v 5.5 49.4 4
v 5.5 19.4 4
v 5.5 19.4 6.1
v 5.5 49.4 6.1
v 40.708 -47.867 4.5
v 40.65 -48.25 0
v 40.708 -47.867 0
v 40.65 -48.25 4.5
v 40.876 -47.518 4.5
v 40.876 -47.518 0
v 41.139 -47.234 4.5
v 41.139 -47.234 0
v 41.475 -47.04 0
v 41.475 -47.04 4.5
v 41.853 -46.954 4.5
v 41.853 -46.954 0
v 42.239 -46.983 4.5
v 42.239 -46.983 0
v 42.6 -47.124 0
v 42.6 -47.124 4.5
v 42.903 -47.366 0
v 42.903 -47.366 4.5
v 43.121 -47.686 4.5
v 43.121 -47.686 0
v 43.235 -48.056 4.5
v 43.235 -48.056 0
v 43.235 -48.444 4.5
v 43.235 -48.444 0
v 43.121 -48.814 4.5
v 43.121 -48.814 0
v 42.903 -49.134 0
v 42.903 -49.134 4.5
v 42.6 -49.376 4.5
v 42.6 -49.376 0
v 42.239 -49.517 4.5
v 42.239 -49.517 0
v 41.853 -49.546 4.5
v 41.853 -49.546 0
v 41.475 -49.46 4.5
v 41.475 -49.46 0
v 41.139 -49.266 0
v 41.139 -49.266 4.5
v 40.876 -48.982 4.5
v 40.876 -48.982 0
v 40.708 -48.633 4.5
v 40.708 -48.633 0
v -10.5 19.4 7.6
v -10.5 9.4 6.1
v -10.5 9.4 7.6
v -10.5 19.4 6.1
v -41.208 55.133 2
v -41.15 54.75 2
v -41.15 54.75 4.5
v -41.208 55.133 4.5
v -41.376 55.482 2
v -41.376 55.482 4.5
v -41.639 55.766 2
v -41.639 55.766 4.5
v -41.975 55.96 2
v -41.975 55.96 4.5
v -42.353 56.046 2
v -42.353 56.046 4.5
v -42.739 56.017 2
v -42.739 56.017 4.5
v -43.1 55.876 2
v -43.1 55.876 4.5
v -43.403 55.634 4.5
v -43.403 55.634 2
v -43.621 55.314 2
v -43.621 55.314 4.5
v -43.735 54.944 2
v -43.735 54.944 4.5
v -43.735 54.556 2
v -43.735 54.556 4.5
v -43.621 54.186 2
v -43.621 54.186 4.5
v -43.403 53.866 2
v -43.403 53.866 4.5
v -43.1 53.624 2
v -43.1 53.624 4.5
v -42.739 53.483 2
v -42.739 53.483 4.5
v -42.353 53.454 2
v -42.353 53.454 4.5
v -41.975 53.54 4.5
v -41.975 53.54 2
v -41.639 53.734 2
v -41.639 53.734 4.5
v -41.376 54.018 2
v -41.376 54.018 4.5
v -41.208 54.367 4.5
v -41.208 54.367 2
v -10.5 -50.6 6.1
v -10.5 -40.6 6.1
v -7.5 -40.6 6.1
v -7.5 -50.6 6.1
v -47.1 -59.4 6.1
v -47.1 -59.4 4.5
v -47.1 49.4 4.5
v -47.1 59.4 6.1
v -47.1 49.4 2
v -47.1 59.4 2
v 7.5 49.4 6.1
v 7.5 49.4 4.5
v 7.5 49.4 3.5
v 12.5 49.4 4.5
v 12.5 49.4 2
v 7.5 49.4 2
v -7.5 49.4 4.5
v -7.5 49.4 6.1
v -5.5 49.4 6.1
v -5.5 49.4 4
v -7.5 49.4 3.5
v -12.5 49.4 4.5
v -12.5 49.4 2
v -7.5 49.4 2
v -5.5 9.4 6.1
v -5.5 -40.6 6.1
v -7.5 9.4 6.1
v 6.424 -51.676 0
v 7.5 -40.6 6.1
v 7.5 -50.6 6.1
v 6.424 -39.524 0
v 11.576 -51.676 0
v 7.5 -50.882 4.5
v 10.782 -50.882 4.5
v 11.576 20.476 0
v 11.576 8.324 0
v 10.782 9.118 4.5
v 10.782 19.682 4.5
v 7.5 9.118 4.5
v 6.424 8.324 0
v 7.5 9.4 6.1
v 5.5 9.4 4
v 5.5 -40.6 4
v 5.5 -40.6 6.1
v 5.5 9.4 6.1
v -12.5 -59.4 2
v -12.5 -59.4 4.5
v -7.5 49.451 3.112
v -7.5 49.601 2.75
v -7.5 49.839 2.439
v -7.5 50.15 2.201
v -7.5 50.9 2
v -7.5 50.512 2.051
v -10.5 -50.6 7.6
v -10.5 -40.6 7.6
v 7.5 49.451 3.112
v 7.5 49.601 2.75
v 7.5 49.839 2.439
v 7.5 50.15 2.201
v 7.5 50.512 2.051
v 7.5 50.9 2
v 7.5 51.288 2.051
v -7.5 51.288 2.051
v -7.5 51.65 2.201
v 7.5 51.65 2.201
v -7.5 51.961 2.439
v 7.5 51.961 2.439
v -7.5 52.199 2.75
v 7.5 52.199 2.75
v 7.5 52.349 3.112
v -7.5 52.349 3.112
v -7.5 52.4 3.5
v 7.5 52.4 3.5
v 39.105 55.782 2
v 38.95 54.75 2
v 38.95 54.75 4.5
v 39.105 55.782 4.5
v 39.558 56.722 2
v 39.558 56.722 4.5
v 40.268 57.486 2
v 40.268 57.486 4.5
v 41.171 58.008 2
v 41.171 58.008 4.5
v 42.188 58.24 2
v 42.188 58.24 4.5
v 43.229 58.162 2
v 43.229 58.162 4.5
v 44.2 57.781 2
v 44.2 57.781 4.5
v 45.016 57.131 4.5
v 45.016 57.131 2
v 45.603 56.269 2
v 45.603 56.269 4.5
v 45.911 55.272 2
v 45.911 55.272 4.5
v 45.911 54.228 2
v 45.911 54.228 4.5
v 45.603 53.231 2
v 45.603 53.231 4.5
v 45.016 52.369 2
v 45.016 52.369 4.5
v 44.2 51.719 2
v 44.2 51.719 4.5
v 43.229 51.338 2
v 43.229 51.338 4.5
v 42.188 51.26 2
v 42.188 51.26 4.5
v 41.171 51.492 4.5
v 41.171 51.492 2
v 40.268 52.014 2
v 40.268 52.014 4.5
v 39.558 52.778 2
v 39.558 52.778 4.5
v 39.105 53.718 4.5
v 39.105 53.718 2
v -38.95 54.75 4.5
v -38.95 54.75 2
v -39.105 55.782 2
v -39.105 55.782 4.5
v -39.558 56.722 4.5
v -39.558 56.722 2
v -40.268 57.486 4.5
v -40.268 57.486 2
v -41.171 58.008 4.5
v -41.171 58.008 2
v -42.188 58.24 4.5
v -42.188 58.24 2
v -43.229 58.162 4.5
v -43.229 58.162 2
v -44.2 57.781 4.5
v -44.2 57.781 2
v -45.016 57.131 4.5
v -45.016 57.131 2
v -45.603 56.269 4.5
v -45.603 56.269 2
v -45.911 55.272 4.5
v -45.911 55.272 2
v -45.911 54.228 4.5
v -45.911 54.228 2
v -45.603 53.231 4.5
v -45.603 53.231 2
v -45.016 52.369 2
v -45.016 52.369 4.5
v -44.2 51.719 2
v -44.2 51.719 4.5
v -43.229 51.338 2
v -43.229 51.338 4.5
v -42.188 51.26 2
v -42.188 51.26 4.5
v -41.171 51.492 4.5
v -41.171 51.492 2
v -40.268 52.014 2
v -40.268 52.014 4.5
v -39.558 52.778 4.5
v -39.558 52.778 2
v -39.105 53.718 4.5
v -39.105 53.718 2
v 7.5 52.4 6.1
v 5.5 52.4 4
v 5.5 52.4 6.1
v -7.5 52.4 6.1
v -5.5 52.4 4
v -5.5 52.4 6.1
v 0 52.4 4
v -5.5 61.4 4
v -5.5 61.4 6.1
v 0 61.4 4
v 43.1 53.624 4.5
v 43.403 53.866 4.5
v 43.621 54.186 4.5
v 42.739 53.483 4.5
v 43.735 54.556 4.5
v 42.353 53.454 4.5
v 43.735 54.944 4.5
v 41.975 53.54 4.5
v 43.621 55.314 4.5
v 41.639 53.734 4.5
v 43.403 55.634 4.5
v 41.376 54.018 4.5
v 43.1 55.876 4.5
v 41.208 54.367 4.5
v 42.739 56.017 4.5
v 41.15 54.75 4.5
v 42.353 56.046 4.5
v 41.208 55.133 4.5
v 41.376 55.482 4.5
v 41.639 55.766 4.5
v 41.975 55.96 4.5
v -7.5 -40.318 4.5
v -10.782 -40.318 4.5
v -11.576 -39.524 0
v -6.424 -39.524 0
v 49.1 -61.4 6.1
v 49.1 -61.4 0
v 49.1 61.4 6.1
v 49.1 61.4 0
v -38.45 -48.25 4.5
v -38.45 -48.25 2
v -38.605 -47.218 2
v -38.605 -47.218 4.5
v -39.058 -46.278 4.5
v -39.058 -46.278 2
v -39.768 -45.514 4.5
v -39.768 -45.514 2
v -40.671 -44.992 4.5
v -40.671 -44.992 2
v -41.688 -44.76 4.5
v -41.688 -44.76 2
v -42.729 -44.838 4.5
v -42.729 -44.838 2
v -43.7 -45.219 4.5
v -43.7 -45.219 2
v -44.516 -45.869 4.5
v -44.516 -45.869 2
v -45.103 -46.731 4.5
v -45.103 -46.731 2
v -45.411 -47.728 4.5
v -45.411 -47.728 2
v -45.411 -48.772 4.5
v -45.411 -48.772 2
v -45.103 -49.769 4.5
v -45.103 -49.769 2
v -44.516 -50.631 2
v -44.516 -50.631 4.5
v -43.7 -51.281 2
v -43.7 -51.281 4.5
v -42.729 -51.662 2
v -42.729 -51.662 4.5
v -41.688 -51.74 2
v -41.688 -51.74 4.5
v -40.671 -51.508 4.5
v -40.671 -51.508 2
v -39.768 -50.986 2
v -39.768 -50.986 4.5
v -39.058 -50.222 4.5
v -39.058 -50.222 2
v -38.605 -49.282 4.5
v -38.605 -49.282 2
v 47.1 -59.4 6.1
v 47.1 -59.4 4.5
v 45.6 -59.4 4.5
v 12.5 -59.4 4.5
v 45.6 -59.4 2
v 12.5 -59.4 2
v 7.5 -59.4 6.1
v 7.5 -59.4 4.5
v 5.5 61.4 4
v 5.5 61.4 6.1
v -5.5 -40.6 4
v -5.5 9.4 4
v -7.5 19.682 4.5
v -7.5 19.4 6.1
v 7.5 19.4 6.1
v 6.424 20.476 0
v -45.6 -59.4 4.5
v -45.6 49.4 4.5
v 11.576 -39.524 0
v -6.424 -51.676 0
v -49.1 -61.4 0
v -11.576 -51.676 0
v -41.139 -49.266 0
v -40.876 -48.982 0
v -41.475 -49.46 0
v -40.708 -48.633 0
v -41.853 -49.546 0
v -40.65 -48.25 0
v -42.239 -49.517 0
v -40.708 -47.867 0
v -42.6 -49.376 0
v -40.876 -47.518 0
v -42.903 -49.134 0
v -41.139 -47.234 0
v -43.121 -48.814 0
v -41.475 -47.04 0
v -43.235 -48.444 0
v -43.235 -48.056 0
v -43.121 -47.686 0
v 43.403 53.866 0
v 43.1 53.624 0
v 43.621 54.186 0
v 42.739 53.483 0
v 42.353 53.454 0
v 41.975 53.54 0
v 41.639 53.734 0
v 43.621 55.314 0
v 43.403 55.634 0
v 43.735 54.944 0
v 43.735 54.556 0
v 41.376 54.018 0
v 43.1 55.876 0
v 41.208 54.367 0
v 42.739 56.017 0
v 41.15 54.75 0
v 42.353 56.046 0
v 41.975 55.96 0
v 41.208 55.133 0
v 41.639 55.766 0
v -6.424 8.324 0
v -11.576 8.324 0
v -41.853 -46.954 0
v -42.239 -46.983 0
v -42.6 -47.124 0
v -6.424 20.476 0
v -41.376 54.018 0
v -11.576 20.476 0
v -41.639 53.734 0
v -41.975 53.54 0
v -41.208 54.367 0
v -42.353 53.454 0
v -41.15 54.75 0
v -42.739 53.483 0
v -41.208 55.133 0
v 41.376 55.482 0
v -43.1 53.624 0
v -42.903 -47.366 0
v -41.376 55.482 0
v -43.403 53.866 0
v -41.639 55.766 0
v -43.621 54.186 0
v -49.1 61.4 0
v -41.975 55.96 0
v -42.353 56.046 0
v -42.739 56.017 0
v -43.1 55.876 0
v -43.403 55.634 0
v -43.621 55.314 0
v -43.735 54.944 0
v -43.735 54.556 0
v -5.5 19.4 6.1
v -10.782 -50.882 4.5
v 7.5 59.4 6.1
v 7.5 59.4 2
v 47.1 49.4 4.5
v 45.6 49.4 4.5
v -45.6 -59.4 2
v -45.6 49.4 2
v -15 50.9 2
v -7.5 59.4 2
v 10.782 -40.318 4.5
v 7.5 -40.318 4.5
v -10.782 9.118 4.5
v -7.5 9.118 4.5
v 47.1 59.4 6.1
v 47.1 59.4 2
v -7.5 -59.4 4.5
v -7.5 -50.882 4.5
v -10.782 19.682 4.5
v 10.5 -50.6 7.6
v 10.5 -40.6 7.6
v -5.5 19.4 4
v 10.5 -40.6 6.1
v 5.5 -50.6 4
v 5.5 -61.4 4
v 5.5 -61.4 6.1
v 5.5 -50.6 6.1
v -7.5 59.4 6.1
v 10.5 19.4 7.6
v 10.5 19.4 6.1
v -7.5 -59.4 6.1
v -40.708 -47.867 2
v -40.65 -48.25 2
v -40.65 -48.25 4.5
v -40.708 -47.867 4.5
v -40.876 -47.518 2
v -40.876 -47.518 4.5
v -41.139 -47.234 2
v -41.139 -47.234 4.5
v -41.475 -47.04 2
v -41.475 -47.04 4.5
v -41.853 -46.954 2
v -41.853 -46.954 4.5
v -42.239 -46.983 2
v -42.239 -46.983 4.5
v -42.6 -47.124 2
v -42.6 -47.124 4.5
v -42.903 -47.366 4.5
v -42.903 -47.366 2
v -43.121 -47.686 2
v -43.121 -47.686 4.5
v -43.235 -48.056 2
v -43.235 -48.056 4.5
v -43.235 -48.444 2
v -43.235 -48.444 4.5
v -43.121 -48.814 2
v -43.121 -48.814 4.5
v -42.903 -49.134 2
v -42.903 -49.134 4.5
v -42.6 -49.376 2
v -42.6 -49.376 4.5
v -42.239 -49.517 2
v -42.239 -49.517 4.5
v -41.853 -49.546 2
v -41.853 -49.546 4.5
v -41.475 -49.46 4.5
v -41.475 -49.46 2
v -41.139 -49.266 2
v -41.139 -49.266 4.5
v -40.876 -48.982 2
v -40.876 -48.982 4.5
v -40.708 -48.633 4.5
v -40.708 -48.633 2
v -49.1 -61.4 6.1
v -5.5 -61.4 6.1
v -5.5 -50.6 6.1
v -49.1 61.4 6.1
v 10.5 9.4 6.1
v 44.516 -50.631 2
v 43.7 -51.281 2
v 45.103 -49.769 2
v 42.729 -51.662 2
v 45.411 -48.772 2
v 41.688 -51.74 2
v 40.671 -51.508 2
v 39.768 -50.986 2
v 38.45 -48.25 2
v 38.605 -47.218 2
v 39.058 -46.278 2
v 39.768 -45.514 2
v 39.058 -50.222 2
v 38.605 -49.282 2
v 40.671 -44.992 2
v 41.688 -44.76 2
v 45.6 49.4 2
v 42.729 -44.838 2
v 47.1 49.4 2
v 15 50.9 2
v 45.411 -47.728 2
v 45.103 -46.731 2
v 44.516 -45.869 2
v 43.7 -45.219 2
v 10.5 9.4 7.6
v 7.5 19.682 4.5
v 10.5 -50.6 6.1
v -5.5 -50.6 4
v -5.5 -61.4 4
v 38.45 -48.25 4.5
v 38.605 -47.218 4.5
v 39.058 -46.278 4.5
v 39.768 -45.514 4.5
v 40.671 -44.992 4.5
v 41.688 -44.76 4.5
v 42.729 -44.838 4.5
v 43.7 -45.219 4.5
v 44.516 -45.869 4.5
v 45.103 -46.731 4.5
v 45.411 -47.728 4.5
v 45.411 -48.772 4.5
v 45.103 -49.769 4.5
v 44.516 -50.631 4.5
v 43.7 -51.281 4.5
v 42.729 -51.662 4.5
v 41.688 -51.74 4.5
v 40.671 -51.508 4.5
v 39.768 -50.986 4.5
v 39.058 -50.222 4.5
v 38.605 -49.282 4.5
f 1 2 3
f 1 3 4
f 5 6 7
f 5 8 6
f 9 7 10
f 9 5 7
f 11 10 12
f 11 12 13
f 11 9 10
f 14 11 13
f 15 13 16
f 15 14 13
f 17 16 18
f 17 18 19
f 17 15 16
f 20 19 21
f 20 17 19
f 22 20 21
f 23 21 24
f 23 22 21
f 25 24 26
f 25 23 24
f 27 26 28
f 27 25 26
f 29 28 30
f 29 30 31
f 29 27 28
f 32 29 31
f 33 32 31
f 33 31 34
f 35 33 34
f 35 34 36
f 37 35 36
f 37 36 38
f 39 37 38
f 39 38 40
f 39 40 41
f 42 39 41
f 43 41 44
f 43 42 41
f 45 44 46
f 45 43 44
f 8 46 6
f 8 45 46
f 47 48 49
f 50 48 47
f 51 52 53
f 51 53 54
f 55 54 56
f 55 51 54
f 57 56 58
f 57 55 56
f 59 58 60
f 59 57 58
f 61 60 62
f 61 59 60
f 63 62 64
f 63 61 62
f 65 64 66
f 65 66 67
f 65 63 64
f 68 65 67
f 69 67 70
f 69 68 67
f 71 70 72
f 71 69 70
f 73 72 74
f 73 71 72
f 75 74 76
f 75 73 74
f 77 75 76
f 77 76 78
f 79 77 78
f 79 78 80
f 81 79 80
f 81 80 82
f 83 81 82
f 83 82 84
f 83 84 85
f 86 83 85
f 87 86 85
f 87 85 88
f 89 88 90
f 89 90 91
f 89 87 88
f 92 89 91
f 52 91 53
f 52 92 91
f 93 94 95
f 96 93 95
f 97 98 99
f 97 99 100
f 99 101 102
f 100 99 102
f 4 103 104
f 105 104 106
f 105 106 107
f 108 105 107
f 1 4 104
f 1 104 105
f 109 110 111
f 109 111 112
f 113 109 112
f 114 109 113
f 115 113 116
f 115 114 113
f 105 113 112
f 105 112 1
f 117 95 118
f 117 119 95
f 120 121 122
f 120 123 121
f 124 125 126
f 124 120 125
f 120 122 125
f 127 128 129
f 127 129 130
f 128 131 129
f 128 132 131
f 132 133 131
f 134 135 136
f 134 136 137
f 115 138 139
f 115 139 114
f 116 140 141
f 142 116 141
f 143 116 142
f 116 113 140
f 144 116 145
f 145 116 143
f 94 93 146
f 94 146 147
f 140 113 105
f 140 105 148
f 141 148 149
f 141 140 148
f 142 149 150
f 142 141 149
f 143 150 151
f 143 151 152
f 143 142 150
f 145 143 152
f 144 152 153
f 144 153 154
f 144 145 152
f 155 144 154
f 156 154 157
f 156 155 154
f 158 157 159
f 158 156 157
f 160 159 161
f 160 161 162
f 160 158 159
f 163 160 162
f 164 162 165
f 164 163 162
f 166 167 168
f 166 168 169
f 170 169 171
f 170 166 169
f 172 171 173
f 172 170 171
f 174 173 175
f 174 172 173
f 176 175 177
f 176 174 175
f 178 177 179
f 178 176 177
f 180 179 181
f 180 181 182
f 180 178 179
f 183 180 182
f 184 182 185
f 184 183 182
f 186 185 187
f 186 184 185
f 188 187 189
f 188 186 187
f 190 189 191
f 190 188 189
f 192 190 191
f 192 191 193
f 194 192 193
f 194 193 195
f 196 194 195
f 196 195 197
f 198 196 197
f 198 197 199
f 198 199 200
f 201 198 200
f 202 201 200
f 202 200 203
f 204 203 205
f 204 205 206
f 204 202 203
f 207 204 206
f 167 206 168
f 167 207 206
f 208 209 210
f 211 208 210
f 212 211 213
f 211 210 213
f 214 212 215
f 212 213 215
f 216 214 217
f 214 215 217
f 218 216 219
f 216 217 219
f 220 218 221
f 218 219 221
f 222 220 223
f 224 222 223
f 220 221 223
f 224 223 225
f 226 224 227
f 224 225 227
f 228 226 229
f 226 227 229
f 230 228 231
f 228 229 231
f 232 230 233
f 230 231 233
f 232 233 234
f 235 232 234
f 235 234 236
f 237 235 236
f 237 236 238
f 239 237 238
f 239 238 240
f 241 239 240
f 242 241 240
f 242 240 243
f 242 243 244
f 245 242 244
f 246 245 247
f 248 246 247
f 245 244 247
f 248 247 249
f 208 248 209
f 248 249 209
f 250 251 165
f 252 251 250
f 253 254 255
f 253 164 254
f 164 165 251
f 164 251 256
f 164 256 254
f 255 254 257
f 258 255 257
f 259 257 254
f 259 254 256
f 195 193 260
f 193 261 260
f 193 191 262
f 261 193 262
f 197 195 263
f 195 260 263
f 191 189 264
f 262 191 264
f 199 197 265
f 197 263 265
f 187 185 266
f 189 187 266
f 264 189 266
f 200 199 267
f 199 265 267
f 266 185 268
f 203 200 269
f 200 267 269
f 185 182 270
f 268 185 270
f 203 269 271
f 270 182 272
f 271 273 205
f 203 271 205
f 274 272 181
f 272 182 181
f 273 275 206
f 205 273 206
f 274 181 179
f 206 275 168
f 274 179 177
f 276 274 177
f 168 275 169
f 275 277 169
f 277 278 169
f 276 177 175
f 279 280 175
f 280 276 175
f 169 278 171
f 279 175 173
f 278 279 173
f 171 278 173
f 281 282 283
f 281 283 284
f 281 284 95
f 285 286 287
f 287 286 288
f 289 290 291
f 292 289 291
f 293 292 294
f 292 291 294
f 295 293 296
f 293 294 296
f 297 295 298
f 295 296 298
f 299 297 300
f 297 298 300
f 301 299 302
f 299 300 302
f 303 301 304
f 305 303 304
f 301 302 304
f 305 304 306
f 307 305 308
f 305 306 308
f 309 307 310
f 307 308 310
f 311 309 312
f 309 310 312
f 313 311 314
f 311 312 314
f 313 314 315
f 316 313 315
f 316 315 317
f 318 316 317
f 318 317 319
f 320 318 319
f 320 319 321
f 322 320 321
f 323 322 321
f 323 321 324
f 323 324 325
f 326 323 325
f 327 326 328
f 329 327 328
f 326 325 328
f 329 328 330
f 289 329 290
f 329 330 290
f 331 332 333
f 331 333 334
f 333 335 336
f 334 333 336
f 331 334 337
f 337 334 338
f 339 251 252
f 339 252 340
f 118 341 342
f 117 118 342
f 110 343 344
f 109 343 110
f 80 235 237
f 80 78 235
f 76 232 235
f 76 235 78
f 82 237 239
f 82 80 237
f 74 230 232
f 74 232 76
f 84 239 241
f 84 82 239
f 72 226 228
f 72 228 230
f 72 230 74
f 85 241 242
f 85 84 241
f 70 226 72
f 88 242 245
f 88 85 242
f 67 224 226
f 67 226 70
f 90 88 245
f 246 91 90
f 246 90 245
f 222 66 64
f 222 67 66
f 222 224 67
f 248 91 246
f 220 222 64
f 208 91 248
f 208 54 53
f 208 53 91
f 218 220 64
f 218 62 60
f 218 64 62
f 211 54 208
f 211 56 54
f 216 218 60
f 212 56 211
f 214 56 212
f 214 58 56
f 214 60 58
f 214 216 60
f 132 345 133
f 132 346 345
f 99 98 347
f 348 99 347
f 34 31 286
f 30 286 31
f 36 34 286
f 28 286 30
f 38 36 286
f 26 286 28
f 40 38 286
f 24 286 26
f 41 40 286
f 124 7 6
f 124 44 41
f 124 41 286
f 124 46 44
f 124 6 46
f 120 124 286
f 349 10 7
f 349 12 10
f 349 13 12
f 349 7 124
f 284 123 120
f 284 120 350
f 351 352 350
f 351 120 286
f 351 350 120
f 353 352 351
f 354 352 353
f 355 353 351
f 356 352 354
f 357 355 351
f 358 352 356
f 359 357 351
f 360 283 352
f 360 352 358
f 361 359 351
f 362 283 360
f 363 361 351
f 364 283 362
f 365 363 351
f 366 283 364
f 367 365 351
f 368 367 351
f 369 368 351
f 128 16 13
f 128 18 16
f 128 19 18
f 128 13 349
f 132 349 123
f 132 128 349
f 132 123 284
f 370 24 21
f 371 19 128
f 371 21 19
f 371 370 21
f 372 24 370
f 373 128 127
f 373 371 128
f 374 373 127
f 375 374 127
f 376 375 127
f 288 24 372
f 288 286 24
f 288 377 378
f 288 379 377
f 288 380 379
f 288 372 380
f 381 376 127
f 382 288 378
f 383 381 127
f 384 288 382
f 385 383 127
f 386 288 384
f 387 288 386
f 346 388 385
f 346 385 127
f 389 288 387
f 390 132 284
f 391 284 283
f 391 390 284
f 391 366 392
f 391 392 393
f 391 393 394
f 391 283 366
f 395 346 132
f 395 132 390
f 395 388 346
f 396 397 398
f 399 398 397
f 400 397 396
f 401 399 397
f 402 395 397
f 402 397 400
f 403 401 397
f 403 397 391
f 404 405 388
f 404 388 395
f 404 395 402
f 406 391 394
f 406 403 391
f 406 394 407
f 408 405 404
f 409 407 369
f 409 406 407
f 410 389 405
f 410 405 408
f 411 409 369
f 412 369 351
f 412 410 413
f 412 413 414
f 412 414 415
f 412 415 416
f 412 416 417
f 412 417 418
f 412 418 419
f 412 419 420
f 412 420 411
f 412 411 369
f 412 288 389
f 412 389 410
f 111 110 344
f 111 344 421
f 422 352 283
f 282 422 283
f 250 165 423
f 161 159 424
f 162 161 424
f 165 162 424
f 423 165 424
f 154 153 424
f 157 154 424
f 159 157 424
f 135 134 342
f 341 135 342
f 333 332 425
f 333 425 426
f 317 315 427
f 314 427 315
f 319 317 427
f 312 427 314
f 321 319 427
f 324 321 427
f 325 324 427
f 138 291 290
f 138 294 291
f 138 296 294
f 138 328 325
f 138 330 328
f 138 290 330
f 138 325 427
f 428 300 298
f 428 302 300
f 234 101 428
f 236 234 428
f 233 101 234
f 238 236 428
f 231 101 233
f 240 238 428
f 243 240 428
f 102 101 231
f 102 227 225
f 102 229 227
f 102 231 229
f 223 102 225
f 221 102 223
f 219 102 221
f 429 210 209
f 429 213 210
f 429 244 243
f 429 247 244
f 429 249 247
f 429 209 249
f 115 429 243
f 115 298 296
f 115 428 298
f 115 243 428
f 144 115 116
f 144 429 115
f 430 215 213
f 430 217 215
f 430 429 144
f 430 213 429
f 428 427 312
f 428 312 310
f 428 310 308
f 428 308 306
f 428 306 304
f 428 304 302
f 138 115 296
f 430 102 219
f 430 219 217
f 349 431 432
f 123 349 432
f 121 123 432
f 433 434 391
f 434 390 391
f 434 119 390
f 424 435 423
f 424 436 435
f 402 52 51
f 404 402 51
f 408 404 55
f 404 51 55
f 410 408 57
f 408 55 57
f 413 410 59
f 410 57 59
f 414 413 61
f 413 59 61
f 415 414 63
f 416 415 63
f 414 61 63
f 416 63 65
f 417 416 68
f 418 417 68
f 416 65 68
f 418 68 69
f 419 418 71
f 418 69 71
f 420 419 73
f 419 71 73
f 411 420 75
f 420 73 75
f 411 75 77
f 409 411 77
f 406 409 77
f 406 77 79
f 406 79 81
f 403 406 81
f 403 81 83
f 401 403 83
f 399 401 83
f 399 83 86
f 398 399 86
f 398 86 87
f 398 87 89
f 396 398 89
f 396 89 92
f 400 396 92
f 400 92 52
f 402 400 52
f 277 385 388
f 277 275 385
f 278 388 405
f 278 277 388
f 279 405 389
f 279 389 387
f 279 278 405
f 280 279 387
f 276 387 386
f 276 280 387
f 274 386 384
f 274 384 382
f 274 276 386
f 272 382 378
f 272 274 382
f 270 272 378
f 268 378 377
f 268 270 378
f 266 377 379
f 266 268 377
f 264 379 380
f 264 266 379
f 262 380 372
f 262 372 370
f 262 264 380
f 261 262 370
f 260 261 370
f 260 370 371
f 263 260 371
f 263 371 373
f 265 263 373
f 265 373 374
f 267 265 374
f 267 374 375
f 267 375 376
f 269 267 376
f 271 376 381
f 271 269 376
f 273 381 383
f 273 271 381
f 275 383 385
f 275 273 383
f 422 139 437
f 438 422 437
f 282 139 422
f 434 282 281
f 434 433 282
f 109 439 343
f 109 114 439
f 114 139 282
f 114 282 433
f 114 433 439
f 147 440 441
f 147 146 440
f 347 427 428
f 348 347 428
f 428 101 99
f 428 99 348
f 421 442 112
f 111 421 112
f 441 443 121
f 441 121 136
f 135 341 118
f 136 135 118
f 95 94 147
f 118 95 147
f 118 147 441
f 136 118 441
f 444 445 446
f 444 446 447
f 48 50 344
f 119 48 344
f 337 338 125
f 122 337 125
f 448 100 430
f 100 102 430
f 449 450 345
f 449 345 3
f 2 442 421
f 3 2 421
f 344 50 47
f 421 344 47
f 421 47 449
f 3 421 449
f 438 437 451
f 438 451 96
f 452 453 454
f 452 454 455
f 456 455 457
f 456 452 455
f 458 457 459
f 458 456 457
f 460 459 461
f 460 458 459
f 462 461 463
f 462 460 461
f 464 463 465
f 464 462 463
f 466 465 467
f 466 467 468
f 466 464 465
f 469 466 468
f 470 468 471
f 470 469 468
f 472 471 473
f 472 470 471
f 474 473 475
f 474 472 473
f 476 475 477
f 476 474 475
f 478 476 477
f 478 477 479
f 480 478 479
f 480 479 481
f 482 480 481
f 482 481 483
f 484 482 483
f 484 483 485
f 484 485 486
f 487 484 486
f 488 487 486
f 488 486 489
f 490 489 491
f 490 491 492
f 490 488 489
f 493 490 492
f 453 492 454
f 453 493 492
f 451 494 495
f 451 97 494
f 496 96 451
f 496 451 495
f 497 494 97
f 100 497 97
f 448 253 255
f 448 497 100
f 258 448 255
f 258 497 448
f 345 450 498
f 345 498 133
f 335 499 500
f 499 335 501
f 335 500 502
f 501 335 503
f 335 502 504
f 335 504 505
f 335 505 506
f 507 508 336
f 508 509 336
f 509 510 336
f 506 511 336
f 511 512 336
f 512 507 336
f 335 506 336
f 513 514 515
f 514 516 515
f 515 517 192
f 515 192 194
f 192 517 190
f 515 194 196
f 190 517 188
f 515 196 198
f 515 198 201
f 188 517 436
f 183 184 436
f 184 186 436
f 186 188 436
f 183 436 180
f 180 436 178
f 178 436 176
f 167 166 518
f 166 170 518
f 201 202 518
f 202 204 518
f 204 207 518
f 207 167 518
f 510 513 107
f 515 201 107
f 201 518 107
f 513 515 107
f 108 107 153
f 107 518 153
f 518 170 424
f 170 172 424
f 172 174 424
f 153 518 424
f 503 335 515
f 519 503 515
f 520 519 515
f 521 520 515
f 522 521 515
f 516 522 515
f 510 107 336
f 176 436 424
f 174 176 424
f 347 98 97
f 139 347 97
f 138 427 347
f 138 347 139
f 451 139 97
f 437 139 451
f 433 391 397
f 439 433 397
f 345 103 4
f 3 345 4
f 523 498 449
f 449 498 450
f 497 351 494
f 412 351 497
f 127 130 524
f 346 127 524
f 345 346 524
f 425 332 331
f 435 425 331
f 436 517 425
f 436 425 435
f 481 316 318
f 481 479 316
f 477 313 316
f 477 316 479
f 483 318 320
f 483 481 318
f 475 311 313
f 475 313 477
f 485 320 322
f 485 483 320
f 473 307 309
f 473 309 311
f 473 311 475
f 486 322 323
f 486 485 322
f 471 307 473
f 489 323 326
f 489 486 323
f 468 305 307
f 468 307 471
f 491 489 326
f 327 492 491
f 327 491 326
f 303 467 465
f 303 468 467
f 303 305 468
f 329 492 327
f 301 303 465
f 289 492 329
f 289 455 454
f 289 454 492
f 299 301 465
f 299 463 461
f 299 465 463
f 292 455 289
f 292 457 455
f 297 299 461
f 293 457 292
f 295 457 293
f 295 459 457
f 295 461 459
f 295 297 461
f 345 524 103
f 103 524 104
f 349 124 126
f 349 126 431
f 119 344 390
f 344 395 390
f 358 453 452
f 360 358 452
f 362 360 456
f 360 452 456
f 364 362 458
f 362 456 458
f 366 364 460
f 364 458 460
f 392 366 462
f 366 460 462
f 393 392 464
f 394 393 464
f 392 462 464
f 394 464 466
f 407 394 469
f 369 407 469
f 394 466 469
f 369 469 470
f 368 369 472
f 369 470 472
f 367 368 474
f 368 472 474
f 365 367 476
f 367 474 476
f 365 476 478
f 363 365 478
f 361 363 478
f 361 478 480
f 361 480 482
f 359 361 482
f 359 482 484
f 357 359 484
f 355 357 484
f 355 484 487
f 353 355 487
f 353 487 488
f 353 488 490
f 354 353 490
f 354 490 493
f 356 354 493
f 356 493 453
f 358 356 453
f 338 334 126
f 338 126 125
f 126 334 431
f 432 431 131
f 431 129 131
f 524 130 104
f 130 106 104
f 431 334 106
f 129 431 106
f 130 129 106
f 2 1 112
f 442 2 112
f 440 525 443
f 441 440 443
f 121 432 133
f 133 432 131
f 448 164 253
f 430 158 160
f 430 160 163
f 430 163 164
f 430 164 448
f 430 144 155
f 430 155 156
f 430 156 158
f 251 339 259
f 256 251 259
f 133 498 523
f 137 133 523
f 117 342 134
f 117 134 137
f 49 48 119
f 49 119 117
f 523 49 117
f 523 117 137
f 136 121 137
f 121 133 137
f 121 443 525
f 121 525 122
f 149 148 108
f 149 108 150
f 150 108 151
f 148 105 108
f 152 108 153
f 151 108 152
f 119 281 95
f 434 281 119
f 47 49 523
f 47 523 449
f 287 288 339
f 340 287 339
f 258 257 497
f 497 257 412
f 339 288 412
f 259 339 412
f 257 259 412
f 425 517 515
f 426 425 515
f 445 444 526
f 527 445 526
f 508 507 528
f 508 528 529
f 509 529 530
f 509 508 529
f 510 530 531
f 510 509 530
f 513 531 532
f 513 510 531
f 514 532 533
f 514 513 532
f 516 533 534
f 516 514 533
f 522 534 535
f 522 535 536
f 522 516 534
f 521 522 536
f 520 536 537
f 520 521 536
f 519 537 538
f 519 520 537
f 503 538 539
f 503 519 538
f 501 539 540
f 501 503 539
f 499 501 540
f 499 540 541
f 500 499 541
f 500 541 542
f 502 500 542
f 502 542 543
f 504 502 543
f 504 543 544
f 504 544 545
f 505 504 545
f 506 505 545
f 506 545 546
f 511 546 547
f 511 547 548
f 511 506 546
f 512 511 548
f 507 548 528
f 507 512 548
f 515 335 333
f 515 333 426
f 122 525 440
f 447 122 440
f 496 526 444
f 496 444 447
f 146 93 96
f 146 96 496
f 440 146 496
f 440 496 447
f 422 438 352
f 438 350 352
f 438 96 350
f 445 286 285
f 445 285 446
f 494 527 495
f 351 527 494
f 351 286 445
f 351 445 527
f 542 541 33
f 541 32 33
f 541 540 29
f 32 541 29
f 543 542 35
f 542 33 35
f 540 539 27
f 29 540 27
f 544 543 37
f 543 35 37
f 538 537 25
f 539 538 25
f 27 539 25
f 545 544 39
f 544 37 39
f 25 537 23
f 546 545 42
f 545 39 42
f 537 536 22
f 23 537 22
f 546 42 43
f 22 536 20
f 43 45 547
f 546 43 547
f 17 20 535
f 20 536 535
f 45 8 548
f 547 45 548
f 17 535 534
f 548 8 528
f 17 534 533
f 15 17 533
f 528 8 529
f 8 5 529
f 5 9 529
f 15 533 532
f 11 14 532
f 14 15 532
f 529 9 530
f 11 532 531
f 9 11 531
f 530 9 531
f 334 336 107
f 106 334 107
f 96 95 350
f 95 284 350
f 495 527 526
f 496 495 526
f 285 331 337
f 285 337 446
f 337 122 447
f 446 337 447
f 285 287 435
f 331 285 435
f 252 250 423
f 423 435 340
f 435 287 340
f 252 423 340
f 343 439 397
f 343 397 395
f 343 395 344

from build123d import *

# Parameters (mm, degrees)
F0_W      = 43.6
F0_H      = 122.8
F1_DEPTH  = 6.1
F2_T      = -2
F3_R      = 3.5
F3_R_2    = 1.3
F4_DEPTH  = 2.5
F5_DEPTH  = 2.001
F6_W      = 1.5
F6_H      = 108.8
F6_W_2    = 5
F7_DEPTH  = 2.5
F8_W      = 5
F8_H      = 10
F9_DEPTH  = 1.5
F10_W     = 3
F10_H     = 10
F11_DEPTH = 25
F11_TAPER = -10
F0_W_2    = 5.5
F12_DEPTH = 4
F14_DEPTH = 15
F16_W     = 10
F16_H     = 3.6
F17_DEPTH = 11


with BuildPart() as f1:
    # F0 (on Top) → F1 (new body)
    with BuildSketch(Plane.XY):
        with Locations((-27.3, 0)):
            Rectangle(F0_W, F0_H)
    extrude(amount=F1_DEPTH)

    # F2
    f2_openings = [f1.faces().sort_by_distance(p)[0] for p in [
        (-27.3, 0, 6.1),
    ]]
    offset(amount=F2_T, openings=f2_openings)

    # F3 (on face) → F4 (join, through all)
    with BuildSketch(Plane.XY.offset(2)):
        with Locations((-42.45, 54.75)):
            Circle(F3_R)
        with Locations((-42.45, 54.75)):
            Circle(F3_R_2, mode=Mode.SUBTRACT)
        with Locations((-41.95, -48.25)):
            Circle(F3_R)
        with Locations((-41.95, -48.25)):
            Circle(F3_R_2, mode=Mode.SUBTRACT)
    extrude(amount=F4_DEPTH)

    # F5 (cut, through all): faces of the model
    f5_faces = [f1.faces().sort_by_distance(p)[0] for p in [
        (-42.45, 54.75, 2),
        (-41.95, -48.25, 2),
    ]]
    extrude(f5_faces, amount=-F5_DEPTH, mode=Mode.SUBTRACT)

    # F6 (on face) → F7 (join, through all)
    with BuildSketch(Plane.XY.offset(2)):
        with Locations((-46.35, -5)):
            Rectangle(F6_W, F6_H)
        with Locations((-10, -5)):
            Rectangle(F6_W_2, F6_H)
    extrude(amount=F7_DEPTH)

    # F8 (on face) → F9 (join)
    with BuildSketch(Plane.XY.offset(6.1)):
        with Locations((-8, 14.4)):
            Rectangle(F8_W, F8_H)
        with Locations((-8, -45.6)):
            Rectangle(F8_W, F8_H)
    extrude(amount=F9_DEPTH)

    # F10 (on face) → F11 (cut)
    with BuildSketch(Plane(origin=(0, 0, 6.1), x_dir=(1, 0, 0), z_dir=(0, 0, -1))):
        with Locations((-9, -14.4)):
            Rectangle(F10_W, F10_H)
        with Locations((-9, 45.6)):
            Rectangle(F10_W, F10_H)
    extrude(amount=F11_DEPTH, taper=F11_TAPER, mode=Mode.SUBTRACT)

    # F0 (on Top) → F12 (join)
    with BuildSketch(Plane.XY):
        with Locations((-2.75, 0)):
            Rectangle(F0_W_2, F0_H)
    extrude(amount=F12_DEPTH)

    # F13 (on face) → F14 (cut)
    with BuildSketch(Plane.YZ):
        with BuildLine():
            Line((49.4, 7), (49.4, 4))
            Line((49.4, 4), (49.4, 3.5))
            ThreePointArc((49.4, 3.5), (50.9, 2), (52.4, 3.5))
            Line((52.4, 3.5), (52.4, 4))
            Line((52.4, 4), (52.4, 7))
            Line((52.4, 7), (49.4, 7))
        make_face()
    extrude(amount=-F14_DEPTH, mode=Mode.SUBTRACT)

    # F15: F1 across plane


with BuildPart() as f1_1:
    add(f1.part)
    add(f1.part.mirror(Plane.YZ))

    # F16 (on face) → F17 (join, through all)
    with BuildSketch(Plane.YZ.offset(-5.5)):
        with Locations((14.4, 5.8)):
            Rectangle(F16_W, F16_H)
        with Locations((-45.6, 5.8)):
            Rectangle(F16_W, F16_H)
    extrude(amount=F17_DEPTH)


solid = f1_1.part
